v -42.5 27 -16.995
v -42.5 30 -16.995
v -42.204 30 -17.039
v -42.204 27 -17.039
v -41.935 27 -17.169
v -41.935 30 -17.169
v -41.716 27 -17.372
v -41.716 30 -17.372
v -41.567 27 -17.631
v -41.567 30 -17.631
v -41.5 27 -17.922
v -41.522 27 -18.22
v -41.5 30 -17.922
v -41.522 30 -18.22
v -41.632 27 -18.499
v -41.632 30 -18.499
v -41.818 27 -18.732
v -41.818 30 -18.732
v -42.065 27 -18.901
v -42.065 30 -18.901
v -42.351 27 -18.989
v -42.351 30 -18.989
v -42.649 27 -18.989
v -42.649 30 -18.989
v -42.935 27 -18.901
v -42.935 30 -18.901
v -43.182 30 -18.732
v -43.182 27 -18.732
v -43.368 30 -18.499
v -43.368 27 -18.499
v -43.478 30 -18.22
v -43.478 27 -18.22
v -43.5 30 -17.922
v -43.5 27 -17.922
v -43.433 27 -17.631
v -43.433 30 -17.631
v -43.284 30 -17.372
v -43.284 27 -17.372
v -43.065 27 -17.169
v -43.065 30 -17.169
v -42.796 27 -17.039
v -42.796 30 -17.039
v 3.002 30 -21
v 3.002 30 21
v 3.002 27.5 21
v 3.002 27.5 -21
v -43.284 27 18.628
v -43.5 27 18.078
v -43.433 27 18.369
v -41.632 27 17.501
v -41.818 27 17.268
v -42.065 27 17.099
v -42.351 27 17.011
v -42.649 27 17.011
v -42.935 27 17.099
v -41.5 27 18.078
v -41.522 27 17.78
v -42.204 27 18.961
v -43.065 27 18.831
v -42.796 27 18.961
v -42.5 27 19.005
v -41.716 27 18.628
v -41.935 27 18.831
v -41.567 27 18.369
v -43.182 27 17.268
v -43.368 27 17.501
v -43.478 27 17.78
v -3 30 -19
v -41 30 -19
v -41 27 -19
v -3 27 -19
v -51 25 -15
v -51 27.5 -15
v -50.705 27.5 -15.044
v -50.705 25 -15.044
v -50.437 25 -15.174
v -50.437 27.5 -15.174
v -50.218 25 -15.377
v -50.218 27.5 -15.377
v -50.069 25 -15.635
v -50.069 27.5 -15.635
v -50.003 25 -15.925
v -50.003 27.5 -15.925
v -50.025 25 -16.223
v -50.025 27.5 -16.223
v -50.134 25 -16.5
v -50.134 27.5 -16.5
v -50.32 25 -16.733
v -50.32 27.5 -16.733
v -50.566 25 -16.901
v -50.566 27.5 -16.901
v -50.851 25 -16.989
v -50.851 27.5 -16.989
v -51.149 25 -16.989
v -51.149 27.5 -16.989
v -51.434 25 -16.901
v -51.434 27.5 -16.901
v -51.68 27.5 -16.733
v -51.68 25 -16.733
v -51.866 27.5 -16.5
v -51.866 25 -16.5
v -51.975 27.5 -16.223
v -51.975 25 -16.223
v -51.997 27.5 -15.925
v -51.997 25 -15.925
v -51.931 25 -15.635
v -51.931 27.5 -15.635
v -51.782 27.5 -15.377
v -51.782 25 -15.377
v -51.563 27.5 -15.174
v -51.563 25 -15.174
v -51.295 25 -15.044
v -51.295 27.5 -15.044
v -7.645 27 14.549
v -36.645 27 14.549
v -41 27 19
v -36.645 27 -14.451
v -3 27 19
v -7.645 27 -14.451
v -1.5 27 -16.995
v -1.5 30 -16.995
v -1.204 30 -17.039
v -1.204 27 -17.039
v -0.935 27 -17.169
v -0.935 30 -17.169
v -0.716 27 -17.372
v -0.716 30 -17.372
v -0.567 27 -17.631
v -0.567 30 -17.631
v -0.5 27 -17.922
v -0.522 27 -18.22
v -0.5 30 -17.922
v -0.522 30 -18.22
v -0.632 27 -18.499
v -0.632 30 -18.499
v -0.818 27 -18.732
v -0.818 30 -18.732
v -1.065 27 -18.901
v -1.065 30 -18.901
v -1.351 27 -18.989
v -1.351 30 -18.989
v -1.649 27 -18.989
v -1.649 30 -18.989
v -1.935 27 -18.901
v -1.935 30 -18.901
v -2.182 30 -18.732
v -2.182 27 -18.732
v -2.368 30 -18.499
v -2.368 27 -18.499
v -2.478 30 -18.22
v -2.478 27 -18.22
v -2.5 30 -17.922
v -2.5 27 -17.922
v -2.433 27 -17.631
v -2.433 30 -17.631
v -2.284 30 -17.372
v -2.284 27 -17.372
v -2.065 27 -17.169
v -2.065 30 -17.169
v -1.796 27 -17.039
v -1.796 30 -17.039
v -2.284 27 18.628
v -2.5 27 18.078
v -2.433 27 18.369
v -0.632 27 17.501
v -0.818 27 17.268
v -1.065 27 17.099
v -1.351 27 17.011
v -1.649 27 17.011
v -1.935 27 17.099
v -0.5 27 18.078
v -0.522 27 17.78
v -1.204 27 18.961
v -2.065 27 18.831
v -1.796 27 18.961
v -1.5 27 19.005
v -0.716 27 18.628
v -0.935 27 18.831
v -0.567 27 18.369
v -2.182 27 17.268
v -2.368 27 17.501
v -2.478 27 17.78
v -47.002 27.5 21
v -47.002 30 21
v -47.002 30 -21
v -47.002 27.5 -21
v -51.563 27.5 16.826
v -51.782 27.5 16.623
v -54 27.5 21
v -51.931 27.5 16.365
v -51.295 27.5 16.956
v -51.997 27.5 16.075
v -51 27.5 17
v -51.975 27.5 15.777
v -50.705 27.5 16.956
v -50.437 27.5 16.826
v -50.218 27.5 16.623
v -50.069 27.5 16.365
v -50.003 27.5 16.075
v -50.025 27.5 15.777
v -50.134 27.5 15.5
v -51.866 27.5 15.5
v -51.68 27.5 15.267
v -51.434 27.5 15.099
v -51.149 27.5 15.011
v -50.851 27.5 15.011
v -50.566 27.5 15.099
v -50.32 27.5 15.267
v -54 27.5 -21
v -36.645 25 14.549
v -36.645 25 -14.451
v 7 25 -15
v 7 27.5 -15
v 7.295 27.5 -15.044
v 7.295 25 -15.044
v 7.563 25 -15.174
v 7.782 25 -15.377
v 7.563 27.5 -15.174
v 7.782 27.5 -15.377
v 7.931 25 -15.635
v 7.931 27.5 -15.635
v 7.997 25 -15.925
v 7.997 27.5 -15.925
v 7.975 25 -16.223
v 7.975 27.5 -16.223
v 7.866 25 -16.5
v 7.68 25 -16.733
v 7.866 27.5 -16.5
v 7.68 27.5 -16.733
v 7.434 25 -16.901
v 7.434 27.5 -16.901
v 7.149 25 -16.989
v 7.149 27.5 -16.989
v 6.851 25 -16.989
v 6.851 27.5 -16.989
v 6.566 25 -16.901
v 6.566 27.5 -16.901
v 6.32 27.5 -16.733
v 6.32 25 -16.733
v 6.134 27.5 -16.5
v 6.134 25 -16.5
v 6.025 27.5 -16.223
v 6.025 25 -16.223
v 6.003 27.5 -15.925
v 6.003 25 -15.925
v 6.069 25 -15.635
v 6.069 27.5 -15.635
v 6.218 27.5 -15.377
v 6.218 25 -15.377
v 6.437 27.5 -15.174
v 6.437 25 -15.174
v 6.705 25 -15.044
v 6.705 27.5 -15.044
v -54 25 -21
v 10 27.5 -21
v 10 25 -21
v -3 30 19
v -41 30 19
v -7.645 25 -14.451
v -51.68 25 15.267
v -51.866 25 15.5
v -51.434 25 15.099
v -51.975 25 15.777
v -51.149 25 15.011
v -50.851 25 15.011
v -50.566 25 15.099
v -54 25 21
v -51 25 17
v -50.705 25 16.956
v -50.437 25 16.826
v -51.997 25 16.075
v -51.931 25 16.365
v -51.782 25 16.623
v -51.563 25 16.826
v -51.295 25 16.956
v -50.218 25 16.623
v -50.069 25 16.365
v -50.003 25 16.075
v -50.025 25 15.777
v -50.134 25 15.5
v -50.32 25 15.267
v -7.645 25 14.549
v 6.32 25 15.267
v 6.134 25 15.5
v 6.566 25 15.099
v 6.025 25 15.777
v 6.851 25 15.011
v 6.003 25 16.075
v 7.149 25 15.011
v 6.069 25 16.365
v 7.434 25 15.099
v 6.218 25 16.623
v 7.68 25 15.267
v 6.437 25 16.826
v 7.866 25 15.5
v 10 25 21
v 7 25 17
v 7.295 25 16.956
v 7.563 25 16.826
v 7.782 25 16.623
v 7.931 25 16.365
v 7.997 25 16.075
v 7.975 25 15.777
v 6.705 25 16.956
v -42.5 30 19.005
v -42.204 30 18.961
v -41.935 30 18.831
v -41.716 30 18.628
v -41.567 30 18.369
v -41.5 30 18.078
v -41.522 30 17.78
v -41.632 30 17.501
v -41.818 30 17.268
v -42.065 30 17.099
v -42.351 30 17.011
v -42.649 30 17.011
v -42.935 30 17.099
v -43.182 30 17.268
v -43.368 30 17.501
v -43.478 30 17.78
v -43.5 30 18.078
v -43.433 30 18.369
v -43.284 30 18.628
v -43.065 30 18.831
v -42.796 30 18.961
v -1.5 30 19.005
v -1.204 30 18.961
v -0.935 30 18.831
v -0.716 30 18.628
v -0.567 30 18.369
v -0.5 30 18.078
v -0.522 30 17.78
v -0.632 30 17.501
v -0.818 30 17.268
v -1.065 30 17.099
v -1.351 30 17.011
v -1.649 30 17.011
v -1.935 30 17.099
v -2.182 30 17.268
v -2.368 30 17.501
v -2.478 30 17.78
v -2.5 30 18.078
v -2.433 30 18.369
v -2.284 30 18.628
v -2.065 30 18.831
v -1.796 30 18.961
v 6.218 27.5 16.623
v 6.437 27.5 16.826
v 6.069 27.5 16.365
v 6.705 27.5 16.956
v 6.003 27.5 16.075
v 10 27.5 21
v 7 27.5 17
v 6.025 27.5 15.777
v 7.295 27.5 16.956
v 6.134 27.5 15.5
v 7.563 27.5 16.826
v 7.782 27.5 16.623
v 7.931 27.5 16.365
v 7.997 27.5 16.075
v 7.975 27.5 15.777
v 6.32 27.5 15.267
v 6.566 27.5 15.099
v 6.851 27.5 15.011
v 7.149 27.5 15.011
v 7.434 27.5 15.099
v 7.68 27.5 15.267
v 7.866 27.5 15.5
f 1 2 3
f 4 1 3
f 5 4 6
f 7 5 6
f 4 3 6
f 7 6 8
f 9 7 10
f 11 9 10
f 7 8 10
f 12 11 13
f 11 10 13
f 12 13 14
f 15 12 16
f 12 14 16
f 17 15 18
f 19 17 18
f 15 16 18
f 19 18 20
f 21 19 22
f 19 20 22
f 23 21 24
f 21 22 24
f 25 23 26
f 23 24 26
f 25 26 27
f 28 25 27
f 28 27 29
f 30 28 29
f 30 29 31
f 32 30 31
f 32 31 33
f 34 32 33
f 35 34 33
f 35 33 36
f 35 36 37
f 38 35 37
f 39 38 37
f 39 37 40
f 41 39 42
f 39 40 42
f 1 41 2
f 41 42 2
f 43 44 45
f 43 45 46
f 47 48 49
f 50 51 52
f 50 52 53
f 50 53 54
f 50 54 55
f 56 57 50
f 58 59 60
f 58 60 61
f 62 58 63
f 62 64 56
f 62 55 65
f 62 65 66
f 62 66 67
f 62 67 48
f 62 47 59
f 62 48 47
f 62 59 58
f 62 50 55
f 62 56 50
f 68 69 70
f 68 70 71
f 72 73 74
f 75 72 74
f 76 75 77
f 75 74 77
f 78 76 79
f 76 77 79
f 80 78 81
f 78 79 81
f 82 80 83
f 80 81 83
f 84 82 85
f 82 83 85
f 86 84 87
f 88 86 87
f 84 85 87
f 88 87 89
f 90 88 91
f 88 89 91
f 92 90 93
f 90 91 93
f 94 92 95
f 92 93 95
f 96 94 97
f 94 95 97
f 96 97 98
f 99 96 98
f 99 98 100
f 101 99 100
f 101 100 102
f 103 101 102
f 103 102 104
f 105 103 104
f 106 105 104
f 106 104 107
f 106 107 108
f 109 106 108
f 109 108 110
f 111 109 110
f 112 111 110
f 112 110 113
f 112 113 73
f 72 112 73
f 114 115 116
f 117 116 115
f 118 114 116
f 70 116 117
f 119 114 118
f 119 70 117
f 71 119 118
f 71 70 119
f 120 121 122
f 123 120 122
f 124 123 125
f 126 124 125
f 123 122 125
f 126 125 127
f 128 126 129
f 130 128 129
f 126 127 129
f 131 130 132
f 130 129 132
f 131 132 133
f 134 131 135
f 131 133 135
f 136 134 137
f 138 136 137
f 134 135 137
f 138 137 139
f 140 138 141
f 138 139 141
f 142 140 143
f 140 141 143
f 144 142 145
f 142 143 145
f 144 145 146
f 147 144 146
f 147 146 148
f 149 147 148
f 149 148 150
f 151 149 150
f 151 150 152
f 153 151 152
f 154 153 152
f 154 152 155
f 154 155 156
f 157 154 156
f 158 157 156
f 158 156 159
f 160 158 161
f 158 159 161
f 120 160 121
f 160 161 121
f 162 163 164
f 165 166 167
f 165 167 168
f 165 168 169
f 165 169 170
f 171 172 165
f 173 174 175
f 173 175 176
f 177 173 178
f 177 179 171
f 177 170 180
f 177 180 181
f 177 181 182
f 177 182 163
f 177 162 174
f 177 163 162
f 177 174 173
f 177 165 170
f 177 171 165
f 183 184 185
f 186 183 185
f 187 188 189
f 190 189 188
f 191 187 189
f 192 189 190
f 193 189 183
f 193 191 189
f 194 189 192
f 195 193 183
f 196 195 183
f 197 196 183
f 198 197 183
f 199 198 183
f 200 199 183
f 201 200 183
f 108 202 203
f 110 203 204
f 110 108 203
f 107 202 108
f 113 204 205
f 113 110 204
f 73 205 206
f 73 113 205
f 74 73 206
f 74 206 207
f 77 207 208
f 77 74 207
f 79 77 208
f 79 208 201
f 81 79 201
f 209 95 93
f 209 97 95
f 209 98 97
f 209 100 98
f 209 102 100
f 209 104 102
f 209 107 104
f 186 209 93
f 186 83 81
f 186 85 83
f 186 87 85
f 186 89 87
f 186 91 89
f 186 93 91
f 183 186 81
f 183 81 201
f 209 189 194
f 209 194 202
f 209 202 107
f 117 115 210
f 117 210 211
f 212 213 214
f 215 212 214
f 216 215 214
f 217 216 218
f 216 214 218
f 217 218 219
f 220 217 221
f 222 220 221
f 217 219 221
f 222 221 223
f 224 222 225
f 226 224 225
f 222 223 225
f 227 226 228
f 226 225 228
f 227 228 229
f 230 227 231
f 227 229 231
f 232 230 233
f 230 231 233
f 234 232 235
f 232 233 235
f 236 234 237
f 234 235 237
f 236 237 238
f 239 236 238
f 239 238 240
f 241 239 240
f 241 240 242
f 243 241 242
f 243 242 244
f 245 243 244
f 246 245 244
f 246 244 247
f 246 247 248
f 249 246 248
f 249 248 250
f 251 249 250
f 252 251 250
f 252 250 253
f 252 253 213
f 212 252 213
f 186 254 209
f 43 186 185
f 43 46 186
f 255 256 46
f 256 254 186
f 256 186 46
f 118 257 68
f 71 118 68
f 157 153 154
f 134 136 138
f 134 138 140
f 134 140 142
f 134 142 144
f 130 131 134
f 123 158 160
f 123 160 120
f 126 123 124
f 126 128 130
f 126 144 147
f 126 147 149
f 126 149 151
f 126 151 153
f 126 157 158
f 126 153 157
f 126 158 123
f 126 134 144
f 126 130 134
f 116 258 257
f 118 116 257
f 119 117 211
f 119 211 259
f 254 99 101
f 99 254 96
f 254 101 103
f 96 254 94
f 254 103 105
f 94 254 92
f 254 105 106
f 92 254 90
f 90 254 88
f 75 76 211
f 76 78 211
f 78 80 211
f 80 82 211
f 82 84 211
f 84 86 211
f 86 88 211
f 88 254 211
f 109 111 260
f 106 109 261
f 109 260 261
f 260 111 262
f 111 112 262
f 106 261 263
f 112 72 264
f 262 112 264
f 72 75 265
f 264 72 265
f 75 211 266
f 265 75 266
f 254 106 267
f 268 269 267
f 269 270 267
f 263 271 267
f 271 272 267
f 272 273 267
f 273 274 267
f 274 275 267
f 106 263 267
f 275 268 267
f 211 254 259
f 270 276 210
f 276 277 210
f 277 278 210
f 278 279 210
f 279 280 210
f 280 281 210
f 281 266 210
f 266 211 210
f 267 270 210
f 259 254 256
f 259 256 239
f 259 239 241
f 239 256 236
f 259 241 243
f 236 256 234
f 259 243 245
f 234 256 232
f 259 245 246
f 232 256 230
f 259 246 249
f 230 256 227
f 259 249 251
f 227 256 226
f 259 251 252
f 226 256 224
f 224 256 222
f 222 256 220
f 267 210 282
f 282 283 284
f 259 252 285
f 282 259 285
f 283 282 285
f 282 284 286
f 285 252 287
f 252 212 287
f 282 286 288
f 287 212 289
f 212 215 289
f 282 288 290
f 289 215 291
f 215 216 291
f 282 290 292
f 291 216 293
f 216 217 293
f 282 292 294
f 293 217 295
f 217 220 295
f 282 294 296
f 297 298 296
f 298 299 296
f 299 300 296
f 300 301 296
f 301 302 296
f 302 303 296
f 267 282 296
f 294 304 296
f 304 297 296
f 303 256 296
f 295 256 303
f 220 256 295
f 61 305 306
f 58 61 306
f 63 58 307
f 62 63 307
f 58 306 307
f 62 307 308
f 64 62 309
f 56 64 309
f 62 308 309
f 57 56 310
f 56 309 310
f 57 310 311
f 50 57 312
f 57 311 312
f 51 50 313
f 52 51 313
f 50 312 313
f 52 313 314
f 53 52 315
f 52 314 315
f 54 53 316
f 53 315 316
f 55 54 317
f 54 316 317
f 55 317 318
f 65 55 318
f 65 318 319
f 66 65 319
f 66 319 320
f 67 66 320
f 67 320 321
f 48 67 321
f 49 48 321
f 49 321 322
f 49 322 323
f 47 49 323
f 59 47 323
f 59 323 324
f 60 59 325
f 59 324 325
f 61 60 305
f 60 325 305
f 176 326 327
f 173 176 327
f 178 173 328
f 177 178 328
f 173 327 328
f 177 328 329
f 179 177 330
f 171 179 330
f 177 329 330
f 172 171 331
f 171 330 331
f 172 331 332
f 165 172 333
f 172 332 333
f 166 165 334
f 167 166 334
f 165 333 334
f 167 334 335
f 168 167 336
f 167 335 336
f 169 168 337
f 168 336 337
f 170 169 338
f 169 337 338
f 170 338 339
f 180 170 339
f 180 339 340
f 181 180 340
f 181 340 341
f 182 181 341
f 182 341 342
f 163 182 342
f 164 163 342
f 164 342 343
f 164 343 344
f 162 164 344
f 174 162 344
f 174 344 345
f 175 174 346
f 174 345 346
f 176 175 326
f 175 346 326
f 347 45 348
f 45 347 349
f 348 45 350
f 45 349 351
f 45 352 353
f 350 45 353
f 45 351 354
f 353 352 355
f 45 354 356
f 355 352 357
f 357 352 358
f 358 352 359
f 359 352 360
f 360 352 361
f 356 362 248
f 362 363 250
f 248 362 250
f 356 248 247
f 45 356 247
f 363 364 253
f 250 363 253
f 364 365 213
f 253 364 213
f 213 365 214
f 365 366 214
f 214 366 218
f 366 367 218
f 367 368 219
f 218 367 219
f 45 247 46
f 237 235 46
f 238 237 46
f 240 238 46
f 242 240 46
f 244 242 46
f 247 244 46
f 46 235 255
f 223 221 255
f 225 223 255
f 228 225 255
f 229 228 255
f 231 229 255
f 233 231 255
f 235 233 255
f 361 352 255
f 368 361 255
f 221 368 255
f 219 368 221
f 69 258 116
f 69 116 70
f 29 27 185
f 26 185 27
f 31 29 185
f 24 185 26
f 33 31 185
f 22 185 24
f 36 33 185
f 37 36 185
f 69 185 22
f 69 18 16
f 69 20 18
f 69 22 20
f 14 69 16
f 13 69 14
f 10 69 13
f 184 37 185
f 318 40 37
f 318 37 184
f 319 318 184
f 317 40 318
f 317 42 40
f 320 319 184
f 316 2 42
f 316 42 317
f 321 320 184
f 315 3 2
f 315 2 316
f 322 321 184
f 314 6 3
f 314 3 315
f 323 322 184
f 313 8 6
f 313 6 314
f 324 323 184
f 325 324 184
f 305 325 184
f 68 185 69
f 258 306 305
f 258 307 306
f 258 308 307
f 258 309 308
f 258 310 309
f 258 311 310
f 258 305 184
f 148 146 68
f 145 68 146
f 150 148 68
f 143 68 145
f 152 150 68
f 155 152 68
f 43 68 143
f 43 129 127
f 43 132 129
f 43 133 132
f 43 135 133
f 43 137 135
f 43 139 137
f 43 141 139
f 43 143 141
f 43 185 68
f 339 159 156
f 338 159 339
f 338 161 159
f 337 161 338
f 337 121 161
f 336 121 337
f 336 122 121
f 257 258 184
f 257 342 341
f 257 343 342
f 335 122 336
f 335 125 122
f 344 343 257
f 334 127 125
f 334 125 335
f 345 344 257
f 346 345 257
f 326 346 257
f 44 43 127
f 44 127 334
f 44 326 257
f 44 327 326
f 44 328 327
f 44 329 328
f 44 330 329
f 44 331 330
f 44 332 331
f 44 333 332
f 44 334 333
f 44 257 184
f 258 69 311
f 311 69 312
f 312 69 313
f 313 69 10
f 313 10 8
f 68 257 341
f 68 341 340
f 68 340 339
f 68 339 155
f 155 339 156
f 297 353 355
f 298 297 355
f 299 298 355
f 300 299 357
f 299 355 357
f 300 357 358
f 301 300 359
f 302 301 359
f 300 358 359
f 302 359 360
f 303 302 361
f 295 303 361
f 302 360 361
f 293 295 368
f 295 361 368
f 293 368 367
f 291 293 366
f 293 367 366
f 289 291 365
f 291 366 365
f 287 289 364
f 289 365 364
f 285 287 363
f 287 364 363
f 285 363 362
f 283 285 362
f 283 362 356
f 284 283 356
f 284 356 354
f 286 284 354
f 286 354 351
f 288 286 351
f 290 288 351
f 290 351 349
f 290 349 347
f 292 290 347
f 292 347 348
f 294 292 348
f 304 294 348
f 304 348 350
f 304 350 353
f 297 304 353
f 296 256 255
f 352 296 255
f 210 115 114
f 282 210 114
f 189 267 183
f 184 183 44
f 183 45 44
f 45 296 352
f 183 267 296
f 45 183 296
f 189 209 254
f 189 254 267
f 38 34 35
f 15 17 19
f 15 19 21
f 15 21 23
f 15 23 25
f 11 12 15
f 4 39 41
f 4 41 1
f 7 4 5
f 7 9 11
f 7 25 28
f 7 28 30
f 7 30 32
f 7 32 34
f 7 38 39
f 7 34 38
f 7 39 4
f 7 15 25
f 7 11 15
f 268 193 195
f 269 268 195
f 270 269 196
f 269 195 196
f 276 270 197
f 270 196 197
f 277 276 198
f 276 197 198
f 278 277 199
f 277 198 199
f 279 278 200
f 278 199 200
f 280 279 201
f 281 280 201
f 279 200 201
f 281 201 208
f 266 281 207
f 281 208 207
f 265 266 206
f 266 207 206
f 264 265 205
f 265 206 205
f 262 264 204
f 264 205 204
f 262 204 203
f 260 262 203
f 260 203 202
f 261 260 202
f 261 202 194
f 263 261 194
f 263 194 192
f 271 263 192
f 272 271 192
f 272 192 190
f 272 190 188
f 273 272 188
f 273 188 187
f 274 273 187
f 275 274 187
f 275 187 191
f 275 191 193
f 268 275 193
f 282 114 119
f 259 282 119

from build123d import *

# Parameters (mm, degrees)
SKETCH1_R            = 11
SKETCH1_R_2          = 7.5
EXTRUDE_THIN1_DEPTH  = 10
BOSS_EXTRUDE2_DEPTH  = 10
SKETCH6_W            = 10
SKETCH6_H            = 5
BOSS_EXTRUDE3_DEPTH  = 10
SKETCH8_W            = 10
SKETCH8_H            = 5
BOSS_EXTRUDE4_DEPTH  = 10
SKETCH9_W            = 42
SKETCH9_H            = 5
BOSS_EXTRUDE5_DEPTH  = 54
SKETCH19_W           = 38
SKETCH19_H           = 38
CUT_EXTRUDE3_DEPTH   = 3
SKETCH25_W           = 29
SKETCH25_H           = 29
CUT_EXTRUDE4_DEPTH   = 2
SKETCH26_R           = 1.00264766
CUT_EXTRUDE5_DEPTH   = 3
LPATTERN4_COUNT      = 2
LPATTERN4_PITCH      = 36
LPATTERN4_COUNT_DIR2 = 2
LPATTERN4_PITCH_DIR2 = 41
SKETCH29_W           = 22
SKETCH29_H           = 36
CUT_EXTRUDE8_DEPTH   = 10
SKETCH35_R           = 1
CUT_EXTRUDE9_DEPTH   = 5
LPATTERN5_COUNT      = 2
LPATTERN5_PITCH      = 58
LPATTERN5_COUNT_DIR2 = 2
LPATTERN5_PITCH_DIR2 = 32
SKETCH37_W           = 42
SKETCH37_H           = 2.5
CUT_EXTRUDE10_DEPTH  = 5
SKETCH38_W           = 42
SKETCH38_H           = 2.5
CUT_EXTRUDE11_DEPTH  = 5
SKETCH39_W           = 1.998284703
SKETCH39_H           = 42
CUT_EXTRUDE12_DEPTH  = 2.5
SKETCH41_W           = 1.997921913
SKETCH41_H           = 42
CUT_EXTRUDE13_DEPTH  = 2.5


with BuildPart() as part:
    # Sketch1 → Extrude-Thin1 (new body)
    with BuildSketch(Plane(origin=(0, 0, 0), x_dir=(0, 0, -1), z_dir=(1, 0, 0))):
        Circle(SKETCH1_R)
        Circle(SKETCH1_R_2, mode=Mode.SUBTRACT)
    extrude(amount=EXTRUDE_THIN1_DEPTH)

    # Sketch3 → Boss-Extrude2 (add)
    with BuildSketch(Plane(origin=(0, 0, 0), x_dir=(0, 0, -1), z_dir=(1, 0, 0))):
        with BuildLine():
            Line((-11, 0), (-11, 30))
            Line((-11, 30), (11, 30))
            Line((11, 30), (11, 0))
            ThreePointArc((11, 0), (0, 11), (-11, 0))
        make_face()
    extrude(amount=BOSS_EXTRUDE2_DEPTH)

    # Sketch6 → Boss-Extrude3 (add)
    with BuildSketch(Plane.XY.offset(11)):
        with Locations((5, 27.5)):
            Rectangle(SKETCH6_W, SKETCH6_H)
    extrude(amount=BOSS_EXTRUDE3_DEPTH)

    # Sketch8 → Boss-Extrude4 (add)
    with BuildSketch(Plane(origin=(0, 0, -11), x_dir=(-1, 0, 0), z_dir=(0, 0, -1))):
        with Locations((-5, 27.5)):
            Rectangle(SKETCH8_W, SKETCH8_H)
    extrude(amount=BOSS_EXTRUDE4_DEPTH)

    # Sketch9 → Boss-Extrude5 (add)
    with BuildSketch(Plane.ZY):
        with Locations((0, 27.5)):
            Rectangle(SKETCH9_W, SKETCH9_H)
    extrude(amount=BOSS_EXTRUDE5_DEPTH)

    # Sketch19 → Cut-Extrude3 (cut)
    with BuildSketch(Plane(origin=(0, 30, 0), x_dir=(1, 0, 0), z_dir=(0, 1, 0))):
        with Locations((-22, 0)):
            Rectangle(SKETCH19_W, SKETCH19_H)
    extrude(amount=-CUT_EXTRUDE3_DEPTH, mode=Mode.SUBTRACT)

    # Sketch25 → Cut-Extrude4 (cut)
    with BuildSketch(Plane(origin=(0, 27, 0), x_dir=(1, 0, 0), z_dir=(0, 1, 0))):
        with Locations((-22.144950272, -0.049169749)):
            Rectangle(SKETCH25_W, SKETCH25_H)
    extrude(amount=-CUT_EXTRUDE4_DEPTH, mode=Mode.SUBTRACT)

    # Sketch26 → Cut-Extrude5 (cut)
    with BuildSketch(Plane(origin=(0, 30, 0), x_dir=(1, 0, 0), z_dir=(0, 1, 0))):
        with Locations(Location((-1.5, 17.99735234, 0), (0, 0, 270))):
            Circle(SKETCH26_R)
    cut_extrude5 = extrude(amount=-CUT_EXTRUDE5_DEPTH, mode=Mode.SUBTRACT)

    # LPattern4: Cut-Extrude5 2 × 2
    with Locations(*[(-j * LPATTERN4_PITCH_DIR2, 0, i * LPATTERN4_PITCH) for i in range(LPATTERN4_COUNT) for j in range(LPATTERN4_COUNT_DIR2) if (i, j) != (0, 0)]):
        add(cut_extrude5, mode=Mode.SUBTRACT)

    # Sketch29 → Cut-Extrude8 (cut)
    with BuildSketch(Plane(origin=(10, 0, 0), x_dir=(0, 0, -1), z_dir=(1, 0, 0))):
        with Locations((0, 7)):
            Rectangle(SKETCH29_W, SKETCH29_H)
    extrude(amount=-CUT_EXTRUDE8_DEPTH, mode=Mode.SUBTRACT)

    # Sketch35 → Cut-Extrude9 (cut)
    with BuildSketch(Plane(origin=(0, 30, 0), x_dir=(1, 0, 0), z_dir=(0, 1, 0))):
        with Locations(Location((7, 16, 0), (0, 0, 270))):
            Circle(SKETCH35_R)
    cut_extrude9 = extrude(amount=-CUT_EXTRUDE9_DEPTH, mode=Mode.SUBTRACT)

    # LPattern5: Cut-Extrude9 2 × 2
    with Locations(*[(-i * LPATTERN5_PITCH, 0, j * LPATTERN5_PITCH_DIR2) for i in range(LPATTERN5_COUNT) for j in range(LPATTERN5_COUNT_DIR2) if (i, j) != (0, 0)]):
        add(cut_extrude9, mode=Mode.SUBTRACT)

    # Sketch37 → Cut-Extrude10 (cut)
    with BuildSketch(Plane(origin=(10, 0, 0), x_dir=(0, 0, -1), z_dir=(1, 0, 0))):
        with Locations((0, 28.75)):
            Rectangle(SKETCH37_W, SKETCH37_H)
    extrude(amount=-CUT_EXTRUDE10_DEPTH, mode=Mode.SUBTRACT)

    # Sketch38 → Cut-Extrude11 (cut)
    with BuildSketch(Plane.ZY.offset(54)):
        with Locations((0, 28.75)):
            Rectangle(SKETCH38_W, SKETCH38_H)
    extrude(amount=-CUT_EXTRUDE11_DEPTH, mode=Mode.SUBTRACT)

    # Sketch39 → Cut-Extrude12 (cut)
    with BuildSketch(Plane(origin=(0, 30, 0), x_dir=(1, 0, 0), z_dir=(0, 1, 0))):
        with Locations((-48.000857649, 0)):
            Rectangle(SKETCH39_W, SKETCH39_H)
    extrude(amount=-CUT_EXTRUDE12_DEPTH, mode=Mode.SUBTRACT)

    # Sketch41 → Cut-Extrude13 (cut)
    with BuildSketch(Plane(origin=(0, 30, 0), x_dir=(1, 0, 0), z_dir=(0, 1, 0))):
        with Locations((4.001039044, 0)):
            Rectangle(SKETCH41_W, SKETCH41_H)
    extrude(amount=-CUT_EXTRUDE13_DEPTH, mode=Mode.SUBTRACT)


solid = part.part
